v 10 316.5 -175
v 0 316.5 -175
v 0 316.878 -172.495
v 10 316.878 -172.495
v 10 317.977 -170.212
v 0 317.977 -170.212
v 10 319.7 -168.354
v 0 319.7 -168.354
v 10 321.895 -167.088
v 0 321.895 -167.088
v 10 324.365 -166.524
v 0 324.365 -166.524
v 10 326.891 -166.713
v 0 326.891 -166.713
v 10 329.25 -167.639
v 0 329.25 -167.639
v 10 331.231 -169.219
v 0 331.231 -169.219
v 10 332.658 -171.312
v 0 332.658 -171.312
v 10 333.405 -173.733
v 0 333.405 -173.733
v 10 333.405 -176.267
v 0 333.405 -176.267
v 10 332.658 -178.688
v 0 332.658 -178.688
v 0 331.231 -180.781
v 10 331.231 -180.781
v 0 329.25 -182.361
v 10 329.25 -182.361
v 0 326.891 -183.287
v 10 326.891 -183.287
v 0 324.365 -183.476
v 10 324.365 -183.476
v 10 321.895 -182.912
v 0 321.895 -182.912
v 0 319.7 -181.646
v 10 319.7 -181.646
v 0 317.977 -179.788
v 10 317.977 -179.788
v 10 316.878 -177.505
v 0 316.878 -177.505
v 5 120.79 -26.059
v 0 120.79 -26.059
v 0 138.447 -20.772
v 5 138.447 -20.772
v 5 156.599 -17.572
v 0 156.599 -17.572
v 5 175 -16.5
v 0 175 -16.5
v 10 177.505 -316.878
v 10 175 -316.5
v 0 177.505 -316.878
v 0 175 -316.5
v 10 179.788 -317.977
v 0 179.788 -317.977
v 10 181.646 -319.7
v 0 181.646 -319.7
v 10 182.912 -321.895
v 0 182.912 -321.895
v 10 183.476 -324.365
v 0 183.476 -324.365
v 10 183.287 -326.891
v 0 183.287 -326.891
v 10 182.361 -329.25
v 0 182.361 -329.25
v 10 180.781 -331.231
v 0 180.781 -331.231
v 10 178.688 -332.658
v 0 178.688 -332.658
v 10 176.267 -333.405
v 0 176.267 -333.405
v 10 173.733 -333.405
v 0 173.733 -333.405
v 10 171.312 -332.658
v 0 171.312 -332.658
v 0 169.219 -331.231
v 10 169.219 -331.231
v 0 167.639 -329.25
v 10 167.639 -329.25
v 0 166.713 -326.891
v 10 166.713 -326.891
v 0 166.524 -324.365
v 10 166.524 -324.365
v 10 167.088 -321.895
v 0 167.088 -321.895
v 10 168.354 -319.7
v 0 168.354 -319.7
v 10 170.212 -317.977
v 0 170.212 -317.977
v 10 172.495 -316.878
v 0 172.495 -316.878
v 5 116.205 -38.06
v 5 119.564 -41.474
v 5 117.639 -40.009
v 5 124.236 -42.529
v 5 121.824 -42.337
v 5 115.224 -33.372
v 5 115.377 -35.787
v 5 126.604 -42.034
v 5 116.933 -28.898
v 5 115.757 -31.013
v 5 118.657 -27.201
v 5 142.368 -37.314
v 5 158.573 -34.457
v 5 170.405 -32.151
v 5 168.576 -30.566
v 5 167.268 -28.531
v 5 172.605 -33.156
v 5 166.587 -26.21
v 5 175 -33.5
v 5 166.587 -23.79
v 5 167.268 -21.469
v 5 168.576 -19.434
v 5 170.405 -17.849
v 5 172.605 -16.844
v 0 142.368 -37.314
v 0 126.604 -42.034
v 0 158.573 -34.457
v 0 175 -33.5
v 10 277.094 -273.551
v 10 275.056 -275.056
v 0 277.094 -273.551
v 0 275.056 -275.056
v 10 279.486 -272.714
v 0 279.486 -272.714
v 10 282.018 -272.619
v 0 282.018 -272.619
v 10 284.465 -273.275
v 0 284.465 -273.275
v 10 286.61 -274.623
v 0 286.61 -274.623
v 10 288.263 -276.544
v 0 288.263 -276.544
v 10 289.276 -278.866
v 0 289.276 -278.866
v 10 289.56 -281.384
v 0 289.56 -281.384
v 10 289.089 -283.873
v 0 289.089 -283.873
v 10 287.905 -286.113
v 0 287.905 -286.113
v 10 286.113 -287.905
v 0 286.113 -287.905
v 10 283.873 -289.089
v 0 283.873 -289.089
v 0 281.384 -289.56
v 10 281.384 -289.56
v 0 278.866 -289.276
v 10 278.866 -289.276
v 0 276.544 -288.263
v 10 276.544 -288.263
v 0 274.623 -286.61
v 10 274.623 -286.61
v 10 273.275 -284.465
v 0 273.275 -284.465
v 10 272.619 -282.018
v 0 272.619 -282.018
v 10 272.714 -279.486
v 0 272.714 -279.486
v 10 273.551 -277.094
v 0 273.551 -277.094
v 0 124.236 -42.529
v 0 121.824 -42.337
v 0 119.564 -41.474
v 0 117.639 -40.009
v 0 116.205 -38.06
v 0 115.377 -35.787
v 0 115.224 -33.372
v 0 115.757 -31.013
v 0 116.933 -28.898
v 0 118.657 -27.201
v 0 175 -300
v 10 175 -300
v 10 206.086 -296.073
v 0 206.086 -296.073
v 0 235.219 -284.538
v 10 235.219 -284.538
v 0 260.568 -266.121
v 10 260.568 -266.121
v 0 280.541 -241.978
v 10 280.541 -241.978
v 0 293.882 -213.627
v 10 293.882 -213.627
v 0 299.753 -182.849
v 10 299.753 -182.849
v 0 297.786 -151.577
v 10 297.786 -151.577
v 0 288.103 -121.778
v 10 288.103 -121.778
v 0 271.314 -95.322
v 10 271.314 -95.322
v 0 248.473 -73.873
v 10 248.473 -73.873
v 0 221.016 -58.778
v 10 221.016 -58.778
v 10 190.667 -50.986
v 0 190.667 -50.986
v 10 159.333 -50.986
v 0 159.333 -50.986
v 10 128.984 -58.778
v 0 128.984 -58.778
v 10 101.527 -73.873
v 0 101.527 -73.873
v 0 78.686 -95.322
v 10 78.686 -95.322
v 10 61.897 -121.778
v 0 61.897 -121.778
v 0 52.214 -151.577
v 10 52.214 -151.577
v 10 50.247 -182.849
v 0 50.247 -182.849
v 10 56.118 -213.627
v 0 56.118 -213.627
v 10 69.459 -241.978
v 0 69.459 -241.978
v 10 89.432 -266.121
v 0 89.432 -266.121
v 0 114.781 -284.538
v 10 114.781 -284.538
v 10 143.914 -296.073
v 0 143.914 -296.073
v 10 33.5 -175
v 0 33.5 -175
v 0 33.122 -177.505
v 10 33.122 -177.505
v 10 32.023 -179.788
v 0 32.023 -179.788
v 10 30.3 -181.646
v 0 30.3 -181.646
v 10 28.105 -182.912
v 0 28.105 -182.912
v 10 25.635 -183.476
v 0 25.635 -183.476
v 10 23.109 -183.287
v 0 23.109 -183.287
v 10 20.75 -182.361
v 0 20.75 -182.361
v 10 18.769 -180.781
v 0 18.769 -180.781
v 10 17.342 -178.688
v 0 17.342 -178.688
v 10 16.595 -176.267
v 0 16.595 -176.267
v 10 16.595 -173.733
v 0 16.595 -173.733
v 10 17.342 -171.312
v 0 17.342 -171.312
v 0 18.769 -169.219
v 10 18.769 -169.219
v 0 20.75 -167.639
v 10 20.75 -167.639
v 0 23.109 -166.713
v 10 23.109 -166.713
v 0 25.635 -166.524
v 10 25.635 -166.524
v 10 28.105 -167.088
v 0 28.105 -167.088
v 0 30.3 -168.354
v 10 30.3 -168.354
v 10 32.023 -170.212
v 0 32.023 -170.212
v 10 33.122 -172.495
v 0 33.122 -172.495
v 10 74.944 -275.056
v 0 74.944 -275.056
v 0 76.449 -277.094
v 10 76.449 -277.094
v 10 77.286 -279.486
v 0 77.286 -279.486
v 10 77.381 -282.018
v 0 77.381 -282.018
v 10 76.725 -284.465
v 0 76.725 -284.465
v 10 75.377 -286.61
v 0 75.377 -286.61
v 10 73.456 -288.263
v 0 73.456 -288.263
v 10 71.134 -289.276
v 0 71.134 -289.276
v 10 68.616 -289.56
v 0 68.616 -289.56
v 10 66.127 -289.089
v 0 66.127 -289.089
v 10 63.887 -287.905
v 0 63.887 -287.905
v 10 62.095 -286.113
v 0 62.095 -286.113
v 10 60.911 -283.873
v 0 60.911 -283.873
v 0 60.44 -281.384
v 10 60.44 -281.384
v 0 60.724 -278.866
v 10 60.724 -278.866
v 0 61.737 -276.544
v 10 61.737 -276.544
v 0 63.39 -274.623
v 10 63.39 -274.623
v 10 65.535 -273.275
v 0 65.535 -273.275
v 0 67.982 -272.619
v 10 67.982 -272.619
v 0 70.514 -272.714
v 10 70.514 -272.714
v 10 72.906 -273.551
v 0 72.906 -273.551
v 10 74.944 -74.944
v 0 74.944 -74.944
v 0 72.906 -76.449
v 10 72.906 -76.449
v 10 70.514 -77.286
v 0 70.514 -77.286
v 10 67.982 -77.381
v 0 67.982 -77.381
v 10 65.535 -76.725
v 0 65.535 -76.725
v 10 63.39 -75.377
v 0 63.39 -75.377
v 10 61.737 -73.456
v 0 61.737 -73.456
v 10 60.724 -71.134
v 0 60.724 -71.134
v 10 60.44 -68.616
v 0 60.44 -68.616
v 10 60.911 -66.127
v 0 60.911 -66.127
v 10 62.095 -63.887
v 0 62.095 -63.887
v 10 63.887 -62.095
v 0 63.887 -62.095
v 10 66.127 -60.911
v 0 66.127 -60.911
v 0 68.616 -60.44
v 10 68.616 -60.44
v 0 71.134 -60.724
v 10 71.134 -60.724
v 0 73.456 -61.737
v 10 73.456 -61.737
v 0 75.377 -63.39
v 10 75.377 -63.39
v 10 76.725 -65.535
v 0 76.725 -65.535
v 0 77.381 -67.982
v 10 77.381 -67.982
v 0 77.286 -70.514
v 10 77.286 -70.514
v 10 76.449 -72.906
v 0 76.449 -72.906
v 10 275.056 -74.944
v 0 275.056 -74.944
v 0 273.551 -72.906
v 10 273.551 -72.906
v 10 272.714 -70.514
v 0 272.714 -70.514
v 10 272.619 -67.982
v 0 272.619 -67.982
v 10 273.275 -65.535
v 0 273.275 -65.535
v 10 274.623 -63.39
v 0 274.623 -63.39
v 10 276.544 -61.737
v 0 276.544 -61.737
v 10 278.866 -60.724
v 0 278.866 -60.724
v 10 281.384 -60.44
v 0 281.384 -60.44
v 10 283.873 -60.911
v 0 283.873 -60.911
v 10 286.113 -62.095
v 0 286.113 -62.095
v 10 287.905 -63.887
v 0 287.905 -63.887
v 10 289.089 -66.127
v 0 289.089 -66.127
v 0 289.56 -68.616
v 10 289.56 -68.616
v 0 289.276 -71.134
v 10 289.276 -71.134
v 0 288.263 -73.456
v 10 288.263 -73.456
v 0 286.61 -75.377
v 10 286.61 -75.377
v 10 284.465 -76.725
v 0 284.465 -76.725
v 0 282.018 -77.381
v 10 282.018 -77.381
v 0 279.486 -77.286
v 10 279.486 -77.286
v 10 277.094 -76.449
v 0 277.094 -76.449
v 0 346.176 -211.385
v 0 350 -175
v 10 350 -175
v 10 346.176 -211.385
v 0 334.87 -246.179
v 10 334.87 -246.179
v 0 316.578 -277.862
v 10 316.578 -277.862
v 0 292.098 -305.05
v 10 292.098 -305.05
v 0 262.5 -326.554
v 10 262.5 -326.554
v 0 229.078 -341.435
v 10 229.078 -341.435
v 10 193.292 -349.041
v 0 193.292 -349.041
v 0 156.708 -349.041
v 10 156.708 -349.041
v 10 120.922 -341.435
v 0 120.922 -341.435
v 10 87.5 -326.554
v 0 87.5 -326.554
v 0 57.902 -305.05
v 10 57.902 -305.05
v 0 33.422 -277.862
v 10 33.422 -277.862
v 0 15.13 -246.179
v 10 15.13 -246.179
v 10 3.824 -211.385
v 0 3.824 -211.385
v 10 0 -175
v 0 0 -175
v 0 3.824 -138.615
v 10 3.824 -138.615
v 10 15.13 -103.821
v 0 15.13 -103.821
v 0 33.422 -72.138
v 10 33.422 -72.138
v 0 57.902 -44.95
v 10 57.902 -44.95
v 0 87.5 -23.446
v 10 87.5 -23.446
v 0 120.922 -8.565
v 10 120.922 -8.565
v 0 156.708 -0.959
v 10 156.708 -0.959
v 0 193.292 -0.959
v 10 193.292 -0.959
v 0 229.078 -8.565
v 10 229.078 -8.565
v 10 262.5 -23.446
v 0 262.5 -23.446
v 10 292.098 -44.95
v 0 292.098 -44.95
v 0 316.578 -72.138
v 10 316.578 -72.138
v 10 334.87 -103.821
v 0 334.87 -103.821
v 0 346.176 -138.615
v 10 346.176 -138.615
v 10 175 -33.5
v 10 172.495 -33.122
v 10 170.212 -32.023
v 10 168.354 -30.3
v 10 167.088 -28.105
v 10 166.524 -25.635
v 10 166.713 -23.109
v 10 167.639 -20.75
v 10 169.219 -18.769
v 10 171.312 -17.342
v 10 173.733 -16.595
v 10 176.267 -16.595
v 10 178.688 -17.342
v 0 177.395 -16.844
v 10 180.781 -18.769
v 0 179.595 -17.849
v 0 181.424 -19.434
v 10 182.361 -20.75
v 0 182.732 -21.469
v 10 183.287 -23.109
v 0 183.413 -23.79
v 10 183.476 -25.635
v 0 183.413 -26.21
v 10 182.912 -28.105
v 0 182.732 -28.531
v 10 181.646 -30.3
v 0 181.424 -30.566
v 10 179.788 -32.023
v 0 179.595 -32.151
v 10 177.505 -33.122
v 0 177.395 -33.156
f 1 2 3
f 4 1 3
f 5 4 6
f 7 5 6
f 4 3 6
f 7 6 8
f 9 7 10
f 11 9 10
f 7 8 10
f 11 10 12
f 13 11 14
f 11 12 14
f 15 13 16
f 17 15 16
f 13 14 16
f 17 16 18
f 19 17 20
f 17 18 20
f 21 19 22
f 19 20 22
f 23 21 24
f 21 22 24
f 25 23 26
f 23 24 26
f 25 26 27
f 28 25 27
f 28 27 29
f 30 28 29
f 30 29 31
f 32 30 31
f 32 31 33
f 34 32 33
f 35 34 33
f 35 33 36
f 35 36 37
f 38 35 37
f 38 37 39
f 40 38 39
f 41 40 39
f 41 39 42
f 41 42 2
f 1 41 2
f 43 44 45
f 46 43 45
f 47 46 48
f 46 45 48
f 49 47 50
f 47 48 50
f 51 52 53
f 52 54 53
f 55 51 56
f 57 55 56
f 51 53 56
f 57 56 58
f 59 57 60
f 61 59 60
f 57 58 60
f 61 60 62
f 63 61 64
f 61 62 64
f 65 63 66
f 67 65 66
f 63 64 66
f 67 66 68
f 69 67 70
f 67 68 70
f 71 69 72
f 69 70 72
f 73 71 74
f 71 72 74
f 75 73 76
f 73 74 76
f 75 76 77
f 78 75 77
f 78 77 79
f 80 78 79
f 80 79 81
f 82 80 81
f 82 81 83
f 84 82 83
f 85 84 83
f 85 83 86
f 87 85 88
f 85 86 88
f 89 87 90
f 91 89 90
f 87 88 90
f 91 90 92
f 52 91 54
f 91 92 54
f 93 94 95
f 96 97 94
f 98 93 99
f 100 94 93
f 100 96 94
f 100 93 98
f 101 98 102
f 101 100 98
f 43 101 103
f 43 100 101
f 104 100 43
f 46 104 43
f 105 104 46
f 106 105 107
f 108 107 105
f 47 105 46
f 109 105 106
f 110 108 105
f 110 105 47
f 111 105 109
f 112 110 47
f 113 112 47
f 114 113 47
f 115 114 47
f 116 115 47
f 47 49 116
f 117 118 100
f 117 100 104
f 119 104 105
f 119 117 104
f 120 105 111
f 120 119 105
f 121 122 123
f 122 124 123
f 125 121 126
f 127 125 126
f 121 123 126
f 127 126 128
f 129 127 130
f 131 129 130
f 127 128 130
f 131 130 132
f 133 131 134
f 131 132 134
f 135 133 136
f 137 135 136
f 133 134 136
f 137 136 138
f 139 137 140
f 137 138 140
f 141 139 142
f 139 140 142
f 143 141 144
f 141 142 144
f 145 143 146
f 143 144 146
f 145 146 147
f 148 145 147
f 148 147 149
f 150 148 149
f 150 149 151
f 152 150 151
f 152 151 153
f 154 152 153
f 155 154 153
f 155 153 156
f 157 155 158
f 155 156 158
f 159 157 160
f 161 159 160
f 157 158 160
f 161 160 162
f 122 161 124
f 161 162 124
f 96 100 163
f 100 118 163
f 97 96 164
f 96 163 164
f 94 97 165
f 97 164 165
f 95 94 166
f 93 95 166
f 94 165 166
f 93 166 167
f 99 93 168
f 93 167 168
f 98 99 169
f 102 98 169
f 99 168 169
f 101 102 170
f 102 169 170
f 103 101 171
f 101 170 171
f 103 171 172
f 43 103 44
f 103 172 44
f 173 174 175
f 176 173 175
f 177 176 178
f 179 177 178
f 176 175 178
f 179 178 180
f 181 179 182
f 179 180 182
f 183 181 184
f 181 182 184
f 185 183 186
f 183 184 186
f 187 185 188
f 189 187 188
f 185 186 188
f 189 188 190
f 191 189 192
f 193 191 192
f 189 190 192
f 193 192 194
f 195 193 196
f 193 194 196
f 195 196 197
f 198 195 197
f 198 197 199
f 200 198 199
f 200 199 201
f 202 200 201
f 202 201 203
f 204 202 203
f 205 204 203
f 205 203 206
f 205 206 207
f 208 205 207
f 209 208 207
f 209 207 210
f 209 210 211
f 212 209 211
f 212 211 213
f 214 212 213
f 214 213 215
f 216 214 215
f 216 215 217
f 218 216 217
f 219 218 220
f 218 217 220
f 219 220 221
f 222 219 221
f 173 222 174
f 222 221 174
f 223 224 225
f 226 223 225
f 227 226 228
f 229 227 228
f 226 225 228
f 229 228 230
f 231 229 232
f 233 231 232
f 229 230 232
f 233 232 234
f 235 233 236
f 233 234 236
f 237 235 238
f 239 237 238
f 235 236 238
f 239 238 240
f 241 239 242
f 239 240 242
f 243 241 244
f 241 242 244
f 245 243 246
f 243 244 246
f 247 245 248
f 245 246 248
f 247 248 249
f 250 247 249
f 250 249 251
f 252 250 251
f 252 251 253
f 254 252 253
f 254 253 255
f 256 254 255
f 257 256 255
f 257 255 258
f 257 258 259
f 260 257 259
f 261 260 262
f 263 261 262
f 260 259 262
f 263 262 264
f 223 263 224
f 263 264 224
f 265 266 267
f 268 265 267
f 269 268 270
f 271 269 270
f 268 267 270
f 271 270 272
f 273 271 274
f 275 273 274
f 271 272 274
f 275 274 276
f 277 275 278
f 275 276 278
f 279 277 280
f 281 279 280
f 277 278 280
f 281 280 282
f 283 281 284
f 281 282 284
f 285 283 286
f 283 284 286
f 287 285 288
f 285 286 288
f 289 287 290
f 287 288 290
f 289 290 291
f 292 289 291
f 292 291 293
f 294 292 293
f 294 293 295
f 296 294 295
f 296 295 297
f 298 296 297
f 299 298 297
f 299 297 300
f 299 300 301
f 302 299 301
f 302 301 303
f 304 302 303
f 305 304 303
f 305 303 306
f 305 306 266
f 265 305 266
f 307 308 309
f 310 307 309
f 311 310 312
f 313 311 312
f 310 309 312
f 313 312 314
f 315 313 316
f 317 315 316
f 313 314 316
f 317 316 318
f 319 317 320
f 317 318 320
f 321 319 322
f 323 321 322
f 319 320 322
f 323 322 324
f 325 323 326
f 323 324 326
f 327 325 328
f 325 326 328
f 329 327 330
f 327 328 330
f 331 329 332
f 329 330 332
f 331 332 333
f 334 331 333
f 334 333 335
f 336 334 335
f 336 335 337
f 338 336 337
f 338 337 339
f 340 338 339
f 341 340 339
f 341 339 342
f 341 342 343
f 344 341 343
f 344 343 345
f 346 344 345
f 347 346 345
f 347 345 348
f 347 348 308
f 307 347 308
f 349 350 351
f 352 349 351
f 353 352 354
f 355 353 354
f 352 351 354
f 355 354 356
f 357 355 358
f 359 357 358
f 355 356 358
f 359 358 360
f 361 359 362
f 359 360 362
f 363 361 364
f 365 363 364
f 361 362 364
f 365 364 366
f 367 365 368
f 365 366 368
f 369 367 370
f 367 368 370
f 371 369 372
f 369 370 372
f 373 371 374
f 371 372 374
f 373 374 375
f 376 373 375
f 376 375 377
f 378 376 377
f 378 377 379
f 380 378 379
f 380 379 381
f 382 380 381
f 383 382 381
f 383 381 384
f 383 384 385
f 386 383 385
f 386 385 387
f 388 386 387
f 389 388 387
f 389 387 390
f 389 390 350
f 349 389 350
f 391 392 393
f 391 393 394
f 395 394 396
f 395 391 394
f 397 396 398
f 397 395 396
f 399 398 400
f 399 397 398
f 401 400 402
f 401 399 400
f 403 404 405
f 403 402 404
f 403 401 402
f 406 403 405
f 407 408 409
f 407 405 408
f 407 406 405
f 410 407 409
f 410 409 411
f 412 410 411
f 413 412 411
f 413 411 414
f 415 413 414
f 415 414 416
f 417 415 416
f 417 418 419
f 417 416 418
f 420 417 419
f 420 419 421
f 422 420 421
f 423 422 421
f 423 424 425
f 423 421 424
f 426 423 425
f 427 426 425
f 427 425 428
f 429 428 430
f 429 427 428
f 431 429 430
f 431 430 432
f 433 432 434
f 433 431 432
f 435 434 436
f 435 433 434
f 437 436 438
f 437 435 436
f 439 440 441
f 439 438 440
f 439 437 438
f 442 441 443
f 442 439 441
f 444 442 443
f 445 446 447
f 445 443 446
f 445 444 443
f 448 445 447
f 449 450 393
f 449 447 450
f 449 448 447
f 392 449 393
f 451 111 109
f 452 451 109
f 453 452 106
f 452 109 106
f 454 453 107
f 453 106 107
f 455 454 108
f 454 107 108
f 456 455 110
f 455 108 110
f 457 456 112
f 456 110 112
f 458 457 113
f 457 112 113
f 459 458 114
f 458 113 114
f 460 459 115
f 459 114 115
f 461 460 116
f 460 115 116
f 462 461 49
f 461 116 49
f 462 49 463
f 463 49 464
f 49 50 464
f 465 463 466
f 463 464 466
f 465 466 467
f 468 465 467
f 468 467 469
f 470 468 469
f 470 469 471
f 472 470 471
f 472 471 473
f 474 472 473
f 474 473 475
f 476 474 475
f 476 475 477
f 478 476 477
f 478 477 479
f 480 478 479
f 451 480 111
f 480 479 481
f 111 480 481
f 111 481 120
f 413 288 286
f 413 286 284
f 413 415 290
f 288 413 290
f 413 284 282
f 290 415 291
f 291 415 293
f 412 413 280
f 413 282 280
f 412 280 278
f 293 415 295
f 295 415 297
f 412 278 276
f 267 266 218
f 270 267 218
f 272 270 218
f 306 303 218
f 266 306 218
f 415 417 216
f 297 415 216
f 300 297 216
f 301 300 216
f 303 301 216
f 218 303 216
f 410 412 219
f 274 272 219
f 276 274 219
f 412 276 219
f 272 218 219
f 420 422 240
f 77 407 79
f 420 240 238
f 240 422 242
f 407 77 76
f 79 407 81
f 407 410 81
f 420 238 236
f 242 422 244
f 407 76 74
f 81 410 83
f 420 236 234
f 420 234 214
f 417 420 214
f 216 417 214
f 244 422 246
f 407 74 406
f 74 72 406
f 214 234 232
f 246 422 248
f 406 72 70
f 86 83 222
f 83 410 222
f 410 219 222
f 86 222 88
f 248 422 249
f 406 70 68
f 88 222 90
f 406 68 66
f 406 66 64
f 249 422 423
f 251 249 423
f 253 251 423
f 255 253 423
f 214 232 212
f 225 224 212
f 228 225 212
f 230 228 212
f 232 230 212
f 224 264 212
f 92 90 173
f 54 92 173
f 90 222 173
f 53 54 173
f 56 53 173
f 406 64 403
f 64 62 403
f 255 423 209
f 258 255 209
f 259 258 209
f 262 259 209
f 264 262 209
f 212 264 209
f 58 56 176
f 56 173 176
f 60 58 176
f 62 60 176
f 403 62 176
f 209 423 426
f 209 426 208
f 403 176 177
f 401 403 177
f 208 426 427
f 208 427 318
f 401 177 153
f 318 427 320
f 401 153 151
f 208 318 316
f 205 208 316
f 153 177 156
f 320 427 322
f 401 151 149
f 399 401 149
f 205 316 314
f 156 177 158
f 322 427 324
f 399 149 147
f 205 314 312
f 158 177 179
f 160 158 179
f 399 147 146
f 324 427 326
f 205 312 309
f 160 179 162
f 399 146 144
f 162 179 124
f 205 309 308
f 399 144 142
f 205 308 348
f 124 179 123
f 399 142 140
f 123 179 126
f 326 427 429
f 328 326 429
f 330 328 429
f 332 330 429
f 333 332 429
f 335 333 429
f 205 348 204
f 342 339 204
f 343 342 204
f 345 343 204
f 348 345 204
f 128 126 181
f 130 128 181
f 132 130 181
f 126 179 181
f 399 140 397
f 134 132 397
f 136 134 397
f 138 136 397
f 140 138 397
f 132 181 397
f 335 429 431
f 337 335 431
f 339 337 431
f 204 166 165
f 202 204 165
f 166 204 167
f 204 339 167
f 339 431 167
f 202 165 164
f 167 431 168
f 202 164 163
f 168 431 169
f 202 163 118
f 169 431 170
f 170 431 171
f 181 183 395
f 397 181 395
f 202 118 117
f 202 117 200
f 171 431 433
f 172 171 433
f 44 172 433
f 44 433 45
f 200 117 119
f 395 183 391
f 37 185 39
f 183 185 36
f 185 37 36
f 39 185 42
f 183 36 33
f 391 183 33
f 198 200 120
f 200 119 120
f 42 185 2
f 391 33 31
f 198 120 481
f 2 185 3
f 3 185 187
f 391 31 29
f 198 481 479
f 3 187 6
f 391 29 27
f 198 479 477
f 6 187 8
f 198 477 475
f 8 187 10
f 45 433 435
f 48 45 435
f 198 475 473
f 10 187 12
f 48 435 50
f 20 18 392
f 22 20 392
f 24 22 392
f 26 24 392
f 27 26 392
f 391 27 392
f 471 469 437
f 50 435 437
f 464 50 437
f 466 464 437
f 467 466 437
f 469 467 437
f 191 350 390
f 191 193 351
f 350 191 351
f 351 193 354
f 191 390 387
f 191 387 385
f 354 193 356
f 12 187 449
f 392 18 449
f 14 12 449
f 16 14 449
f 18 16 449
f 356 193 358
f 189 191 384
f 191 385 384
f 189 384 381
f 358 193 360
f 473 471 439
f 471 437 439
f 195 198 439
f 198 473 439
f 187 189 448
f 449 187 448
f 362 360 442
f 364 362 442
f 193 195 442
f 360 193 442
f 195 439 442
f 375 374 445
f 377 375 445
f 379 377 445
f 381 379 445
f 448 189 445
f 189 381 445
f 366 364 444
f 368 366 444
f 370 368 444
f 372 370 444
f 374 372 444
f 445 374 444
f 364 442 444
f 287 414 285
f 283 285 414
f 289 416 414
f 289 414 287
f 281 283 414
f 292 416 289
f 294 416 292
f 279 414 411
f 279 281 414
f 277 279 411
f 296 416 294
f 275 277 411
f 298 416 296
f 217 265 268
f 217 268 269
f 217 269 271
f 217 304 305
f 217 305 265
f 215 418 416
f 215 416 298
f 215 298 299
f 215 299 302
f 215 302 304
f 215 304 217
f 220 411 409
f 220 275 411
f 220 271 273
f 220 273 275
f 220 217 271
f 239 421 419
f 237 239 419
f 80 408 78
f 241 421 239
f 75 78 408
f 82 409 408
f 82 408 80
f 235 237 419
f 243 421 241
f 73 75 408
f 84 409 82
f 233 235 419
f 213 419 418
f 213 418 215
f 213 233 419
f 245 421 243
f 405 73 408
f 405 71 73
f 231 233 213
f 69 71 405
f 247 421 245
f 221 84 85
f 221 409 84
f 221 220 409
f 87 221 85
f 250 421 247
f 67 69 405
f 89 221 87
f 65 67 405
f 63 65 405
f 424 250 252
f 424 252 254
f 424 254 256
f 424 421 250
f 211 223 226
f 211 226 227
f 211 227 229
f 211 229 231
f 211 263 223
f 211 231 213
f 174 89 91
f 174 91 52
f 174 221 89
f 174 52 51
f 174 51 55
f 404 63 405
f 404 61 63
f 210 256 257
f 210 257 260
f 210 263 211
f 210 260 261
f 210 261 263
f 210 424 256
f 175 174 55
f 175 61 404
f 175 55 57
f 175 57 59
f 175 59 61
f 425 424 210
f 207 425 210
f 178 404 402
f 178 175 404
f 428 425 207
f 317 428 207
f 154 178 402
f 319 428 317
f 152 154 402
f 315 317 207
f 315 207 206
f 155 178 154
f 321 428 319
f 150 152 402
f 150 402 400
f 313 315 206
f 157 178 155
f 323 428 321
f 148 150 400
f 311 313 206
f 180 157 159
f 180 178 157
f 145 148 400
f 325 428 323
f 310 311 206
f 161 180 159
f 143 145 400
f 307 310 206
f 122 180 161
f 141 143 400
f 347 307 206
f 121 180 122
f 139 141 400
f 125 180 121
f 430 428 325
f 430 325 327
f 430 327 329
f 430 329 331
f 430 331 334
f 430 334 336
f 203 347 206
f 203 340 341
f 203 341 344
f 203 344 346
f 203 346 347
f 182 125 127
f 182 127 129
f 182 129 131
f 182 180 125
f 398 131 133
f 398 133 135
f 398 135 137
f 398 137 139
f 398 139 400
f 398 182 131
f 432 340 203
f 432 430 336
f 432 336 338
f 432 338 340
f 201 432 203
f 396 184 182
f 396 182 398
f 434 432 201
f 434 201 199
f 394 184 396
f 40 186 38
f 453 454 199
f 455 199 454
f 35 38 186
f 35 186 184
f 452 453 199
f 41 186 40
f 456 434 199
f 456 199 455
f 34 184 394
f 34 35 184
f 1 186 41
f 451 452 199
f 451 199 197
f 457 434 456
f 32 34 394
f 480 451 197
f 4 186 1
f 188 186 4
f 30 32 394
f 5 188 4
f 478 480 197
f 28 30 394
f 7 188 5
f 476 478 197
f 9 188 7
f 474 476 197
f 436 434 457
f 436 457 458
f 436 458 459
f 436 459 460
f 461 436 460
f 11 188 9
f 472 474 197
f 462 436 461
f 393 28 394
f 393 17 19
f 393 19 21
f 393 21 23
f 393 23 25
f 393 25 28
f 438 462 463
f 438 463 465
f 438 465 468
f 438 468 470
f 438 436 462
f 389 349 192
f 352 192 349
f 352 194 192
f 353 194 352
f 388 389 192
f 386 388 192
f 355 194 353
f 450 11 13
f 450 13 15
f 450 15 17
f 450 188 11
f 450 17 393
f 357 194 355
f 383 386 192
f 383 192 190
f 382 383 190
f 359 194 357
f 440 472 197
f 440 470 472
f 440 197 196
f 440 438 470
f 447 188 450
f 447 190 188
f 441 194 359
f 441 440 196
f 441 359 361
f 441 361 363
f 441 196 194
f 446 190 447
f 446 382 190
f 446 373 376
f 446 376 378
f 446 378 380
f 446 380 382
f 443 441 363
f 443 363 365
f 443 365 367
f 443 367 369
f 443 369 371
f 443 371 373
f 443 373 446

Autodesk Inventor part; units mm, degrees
ref_plane "YZ Plane" through (0, 0, 0) normal (1, 0, 0) x (0, 1, 0)
ref_plane "XZ Plane" through (0, 0, 0) normal (0, 1, 0) x (-1, 0, 0)
ref_plane "XY Plane" through (0, 0, 0) normal (0, 0, 1) x (1, 0, 0)
sketch "Sketch1" plane through (0, 0, 0) normal (1, 0, 0) x (0, 1, 0)
  circle A0 centre (175, -175) radius 175
  point P0 (0, 0)
  dimension "d0" = 175
  dimension "d1" = 175
  dimension "d2" = 350
extrude "Extrusion1" add sketch "Sketch1" along normal blind 10
sketch "Sketch2" plane through (10, 175, -175) normal (1, 0, 0) x (0, 0, -1)
  circle A0 centre (0, 0) radius 125
  point P0 (-175, -175)
  dimension "d5" = 250
extrude "Extrusion2" cut sketch "Sketch2" against normal through all
sketch "Sketch3" plane through (10, 175, -175) normal (1, 0, 0) x (0, 0, -1)
  circle A0 centre (0, 0) radius 175 projected
  point P0 (-175, -175)
  point P1 (-150, 0)
  dimension "d8" = 150
  dimension "d9" = 0
hole "Hole1" at (10, 175, -25) direction (-1, 0, 0) diameter 17 end through all
pattern_circular "Circular Pattern1" count 8 over 360 about axis through (10, 175, -175) along (-1, 0, 0) of "Hole1"
sketch "Sketch5" plane through (0, 175, -175) normal (-1, 0, 0) x (0, 0, 1)
  circle A0 centre (0, 0) radius 125 construction
  line L0 (228.602, 0) -> (0, 0) construction
  line L1 (0, 0) -> (225.8114, -82.1886) construction
  arc A1 (140.9539, -51.303) -> (150, 0) centre (0, 0) ccw construction
  arc A2 (148.9413, -54.2102) -> (158.5, 0) centre (0, 0) ccw
  arc A3 (132.9665, -48.3959) -> (141.5, 0) centre (0, 0) ccw
  arc A4 (132.9665, -48.3959) -> (148.9413, -54.2102) centre (140.9539, -51.303) ccw
  arc A5 (158.5, 0) -> (141.5, 0) centre (150, 0) ccw
  circle A6 centre (0, 0) radius 125 construction
  line L2 (228.602, 0) -> (0, 0) construction
  line L3 (0, 0) -> (225.8114, -82.1886) construction
  arc A7 (140.9539, -51.303) -> (150, 0) centre (0, 0) ccw construction
  arc A8 (148.9413, -54.2102) -> (158.5, 0) centre (0, 0) ccw
  arc A9 (132.9665, -48.3959) -> (141.5, 0) centre (0, 0) ccw
  arc A10 (132.9665, -48.3959) -> (148.9413, -54.2102) centre (140.9539, -51.303) ccw
  arc A11 (158.5, 0) -> (141.5, 0) centre (150, 0) ccw
  point P0 (175, -175)
  point P1 (175, -175)
  dimension "d30" = 20
  dimension "d31" = 150
  dimension "d32" = 8.5
  dimension "d33" = 8.5
  dimension "d34" = 8.5
  dimension "d35" = 8.5
  dimension "d38" = 20
  dimension "d39" = 150
  dimension "d40" = 8.5
  dimension "d41" = 8.5
  dimension "d42" = 8.5
  dimension "d43" = 8.5
extrude "Extrusion3" cut sketch "Sketch5" against normal blind 5
equation "\"d33\" = d32"
equation "\"d34\" = d32"
equation "\"d35\" = d32"
equation "\"d41\" = d40"
equation "\"d42\" = d40"
equation "\"d43\" = d40"
properties part number "MountingRing"
